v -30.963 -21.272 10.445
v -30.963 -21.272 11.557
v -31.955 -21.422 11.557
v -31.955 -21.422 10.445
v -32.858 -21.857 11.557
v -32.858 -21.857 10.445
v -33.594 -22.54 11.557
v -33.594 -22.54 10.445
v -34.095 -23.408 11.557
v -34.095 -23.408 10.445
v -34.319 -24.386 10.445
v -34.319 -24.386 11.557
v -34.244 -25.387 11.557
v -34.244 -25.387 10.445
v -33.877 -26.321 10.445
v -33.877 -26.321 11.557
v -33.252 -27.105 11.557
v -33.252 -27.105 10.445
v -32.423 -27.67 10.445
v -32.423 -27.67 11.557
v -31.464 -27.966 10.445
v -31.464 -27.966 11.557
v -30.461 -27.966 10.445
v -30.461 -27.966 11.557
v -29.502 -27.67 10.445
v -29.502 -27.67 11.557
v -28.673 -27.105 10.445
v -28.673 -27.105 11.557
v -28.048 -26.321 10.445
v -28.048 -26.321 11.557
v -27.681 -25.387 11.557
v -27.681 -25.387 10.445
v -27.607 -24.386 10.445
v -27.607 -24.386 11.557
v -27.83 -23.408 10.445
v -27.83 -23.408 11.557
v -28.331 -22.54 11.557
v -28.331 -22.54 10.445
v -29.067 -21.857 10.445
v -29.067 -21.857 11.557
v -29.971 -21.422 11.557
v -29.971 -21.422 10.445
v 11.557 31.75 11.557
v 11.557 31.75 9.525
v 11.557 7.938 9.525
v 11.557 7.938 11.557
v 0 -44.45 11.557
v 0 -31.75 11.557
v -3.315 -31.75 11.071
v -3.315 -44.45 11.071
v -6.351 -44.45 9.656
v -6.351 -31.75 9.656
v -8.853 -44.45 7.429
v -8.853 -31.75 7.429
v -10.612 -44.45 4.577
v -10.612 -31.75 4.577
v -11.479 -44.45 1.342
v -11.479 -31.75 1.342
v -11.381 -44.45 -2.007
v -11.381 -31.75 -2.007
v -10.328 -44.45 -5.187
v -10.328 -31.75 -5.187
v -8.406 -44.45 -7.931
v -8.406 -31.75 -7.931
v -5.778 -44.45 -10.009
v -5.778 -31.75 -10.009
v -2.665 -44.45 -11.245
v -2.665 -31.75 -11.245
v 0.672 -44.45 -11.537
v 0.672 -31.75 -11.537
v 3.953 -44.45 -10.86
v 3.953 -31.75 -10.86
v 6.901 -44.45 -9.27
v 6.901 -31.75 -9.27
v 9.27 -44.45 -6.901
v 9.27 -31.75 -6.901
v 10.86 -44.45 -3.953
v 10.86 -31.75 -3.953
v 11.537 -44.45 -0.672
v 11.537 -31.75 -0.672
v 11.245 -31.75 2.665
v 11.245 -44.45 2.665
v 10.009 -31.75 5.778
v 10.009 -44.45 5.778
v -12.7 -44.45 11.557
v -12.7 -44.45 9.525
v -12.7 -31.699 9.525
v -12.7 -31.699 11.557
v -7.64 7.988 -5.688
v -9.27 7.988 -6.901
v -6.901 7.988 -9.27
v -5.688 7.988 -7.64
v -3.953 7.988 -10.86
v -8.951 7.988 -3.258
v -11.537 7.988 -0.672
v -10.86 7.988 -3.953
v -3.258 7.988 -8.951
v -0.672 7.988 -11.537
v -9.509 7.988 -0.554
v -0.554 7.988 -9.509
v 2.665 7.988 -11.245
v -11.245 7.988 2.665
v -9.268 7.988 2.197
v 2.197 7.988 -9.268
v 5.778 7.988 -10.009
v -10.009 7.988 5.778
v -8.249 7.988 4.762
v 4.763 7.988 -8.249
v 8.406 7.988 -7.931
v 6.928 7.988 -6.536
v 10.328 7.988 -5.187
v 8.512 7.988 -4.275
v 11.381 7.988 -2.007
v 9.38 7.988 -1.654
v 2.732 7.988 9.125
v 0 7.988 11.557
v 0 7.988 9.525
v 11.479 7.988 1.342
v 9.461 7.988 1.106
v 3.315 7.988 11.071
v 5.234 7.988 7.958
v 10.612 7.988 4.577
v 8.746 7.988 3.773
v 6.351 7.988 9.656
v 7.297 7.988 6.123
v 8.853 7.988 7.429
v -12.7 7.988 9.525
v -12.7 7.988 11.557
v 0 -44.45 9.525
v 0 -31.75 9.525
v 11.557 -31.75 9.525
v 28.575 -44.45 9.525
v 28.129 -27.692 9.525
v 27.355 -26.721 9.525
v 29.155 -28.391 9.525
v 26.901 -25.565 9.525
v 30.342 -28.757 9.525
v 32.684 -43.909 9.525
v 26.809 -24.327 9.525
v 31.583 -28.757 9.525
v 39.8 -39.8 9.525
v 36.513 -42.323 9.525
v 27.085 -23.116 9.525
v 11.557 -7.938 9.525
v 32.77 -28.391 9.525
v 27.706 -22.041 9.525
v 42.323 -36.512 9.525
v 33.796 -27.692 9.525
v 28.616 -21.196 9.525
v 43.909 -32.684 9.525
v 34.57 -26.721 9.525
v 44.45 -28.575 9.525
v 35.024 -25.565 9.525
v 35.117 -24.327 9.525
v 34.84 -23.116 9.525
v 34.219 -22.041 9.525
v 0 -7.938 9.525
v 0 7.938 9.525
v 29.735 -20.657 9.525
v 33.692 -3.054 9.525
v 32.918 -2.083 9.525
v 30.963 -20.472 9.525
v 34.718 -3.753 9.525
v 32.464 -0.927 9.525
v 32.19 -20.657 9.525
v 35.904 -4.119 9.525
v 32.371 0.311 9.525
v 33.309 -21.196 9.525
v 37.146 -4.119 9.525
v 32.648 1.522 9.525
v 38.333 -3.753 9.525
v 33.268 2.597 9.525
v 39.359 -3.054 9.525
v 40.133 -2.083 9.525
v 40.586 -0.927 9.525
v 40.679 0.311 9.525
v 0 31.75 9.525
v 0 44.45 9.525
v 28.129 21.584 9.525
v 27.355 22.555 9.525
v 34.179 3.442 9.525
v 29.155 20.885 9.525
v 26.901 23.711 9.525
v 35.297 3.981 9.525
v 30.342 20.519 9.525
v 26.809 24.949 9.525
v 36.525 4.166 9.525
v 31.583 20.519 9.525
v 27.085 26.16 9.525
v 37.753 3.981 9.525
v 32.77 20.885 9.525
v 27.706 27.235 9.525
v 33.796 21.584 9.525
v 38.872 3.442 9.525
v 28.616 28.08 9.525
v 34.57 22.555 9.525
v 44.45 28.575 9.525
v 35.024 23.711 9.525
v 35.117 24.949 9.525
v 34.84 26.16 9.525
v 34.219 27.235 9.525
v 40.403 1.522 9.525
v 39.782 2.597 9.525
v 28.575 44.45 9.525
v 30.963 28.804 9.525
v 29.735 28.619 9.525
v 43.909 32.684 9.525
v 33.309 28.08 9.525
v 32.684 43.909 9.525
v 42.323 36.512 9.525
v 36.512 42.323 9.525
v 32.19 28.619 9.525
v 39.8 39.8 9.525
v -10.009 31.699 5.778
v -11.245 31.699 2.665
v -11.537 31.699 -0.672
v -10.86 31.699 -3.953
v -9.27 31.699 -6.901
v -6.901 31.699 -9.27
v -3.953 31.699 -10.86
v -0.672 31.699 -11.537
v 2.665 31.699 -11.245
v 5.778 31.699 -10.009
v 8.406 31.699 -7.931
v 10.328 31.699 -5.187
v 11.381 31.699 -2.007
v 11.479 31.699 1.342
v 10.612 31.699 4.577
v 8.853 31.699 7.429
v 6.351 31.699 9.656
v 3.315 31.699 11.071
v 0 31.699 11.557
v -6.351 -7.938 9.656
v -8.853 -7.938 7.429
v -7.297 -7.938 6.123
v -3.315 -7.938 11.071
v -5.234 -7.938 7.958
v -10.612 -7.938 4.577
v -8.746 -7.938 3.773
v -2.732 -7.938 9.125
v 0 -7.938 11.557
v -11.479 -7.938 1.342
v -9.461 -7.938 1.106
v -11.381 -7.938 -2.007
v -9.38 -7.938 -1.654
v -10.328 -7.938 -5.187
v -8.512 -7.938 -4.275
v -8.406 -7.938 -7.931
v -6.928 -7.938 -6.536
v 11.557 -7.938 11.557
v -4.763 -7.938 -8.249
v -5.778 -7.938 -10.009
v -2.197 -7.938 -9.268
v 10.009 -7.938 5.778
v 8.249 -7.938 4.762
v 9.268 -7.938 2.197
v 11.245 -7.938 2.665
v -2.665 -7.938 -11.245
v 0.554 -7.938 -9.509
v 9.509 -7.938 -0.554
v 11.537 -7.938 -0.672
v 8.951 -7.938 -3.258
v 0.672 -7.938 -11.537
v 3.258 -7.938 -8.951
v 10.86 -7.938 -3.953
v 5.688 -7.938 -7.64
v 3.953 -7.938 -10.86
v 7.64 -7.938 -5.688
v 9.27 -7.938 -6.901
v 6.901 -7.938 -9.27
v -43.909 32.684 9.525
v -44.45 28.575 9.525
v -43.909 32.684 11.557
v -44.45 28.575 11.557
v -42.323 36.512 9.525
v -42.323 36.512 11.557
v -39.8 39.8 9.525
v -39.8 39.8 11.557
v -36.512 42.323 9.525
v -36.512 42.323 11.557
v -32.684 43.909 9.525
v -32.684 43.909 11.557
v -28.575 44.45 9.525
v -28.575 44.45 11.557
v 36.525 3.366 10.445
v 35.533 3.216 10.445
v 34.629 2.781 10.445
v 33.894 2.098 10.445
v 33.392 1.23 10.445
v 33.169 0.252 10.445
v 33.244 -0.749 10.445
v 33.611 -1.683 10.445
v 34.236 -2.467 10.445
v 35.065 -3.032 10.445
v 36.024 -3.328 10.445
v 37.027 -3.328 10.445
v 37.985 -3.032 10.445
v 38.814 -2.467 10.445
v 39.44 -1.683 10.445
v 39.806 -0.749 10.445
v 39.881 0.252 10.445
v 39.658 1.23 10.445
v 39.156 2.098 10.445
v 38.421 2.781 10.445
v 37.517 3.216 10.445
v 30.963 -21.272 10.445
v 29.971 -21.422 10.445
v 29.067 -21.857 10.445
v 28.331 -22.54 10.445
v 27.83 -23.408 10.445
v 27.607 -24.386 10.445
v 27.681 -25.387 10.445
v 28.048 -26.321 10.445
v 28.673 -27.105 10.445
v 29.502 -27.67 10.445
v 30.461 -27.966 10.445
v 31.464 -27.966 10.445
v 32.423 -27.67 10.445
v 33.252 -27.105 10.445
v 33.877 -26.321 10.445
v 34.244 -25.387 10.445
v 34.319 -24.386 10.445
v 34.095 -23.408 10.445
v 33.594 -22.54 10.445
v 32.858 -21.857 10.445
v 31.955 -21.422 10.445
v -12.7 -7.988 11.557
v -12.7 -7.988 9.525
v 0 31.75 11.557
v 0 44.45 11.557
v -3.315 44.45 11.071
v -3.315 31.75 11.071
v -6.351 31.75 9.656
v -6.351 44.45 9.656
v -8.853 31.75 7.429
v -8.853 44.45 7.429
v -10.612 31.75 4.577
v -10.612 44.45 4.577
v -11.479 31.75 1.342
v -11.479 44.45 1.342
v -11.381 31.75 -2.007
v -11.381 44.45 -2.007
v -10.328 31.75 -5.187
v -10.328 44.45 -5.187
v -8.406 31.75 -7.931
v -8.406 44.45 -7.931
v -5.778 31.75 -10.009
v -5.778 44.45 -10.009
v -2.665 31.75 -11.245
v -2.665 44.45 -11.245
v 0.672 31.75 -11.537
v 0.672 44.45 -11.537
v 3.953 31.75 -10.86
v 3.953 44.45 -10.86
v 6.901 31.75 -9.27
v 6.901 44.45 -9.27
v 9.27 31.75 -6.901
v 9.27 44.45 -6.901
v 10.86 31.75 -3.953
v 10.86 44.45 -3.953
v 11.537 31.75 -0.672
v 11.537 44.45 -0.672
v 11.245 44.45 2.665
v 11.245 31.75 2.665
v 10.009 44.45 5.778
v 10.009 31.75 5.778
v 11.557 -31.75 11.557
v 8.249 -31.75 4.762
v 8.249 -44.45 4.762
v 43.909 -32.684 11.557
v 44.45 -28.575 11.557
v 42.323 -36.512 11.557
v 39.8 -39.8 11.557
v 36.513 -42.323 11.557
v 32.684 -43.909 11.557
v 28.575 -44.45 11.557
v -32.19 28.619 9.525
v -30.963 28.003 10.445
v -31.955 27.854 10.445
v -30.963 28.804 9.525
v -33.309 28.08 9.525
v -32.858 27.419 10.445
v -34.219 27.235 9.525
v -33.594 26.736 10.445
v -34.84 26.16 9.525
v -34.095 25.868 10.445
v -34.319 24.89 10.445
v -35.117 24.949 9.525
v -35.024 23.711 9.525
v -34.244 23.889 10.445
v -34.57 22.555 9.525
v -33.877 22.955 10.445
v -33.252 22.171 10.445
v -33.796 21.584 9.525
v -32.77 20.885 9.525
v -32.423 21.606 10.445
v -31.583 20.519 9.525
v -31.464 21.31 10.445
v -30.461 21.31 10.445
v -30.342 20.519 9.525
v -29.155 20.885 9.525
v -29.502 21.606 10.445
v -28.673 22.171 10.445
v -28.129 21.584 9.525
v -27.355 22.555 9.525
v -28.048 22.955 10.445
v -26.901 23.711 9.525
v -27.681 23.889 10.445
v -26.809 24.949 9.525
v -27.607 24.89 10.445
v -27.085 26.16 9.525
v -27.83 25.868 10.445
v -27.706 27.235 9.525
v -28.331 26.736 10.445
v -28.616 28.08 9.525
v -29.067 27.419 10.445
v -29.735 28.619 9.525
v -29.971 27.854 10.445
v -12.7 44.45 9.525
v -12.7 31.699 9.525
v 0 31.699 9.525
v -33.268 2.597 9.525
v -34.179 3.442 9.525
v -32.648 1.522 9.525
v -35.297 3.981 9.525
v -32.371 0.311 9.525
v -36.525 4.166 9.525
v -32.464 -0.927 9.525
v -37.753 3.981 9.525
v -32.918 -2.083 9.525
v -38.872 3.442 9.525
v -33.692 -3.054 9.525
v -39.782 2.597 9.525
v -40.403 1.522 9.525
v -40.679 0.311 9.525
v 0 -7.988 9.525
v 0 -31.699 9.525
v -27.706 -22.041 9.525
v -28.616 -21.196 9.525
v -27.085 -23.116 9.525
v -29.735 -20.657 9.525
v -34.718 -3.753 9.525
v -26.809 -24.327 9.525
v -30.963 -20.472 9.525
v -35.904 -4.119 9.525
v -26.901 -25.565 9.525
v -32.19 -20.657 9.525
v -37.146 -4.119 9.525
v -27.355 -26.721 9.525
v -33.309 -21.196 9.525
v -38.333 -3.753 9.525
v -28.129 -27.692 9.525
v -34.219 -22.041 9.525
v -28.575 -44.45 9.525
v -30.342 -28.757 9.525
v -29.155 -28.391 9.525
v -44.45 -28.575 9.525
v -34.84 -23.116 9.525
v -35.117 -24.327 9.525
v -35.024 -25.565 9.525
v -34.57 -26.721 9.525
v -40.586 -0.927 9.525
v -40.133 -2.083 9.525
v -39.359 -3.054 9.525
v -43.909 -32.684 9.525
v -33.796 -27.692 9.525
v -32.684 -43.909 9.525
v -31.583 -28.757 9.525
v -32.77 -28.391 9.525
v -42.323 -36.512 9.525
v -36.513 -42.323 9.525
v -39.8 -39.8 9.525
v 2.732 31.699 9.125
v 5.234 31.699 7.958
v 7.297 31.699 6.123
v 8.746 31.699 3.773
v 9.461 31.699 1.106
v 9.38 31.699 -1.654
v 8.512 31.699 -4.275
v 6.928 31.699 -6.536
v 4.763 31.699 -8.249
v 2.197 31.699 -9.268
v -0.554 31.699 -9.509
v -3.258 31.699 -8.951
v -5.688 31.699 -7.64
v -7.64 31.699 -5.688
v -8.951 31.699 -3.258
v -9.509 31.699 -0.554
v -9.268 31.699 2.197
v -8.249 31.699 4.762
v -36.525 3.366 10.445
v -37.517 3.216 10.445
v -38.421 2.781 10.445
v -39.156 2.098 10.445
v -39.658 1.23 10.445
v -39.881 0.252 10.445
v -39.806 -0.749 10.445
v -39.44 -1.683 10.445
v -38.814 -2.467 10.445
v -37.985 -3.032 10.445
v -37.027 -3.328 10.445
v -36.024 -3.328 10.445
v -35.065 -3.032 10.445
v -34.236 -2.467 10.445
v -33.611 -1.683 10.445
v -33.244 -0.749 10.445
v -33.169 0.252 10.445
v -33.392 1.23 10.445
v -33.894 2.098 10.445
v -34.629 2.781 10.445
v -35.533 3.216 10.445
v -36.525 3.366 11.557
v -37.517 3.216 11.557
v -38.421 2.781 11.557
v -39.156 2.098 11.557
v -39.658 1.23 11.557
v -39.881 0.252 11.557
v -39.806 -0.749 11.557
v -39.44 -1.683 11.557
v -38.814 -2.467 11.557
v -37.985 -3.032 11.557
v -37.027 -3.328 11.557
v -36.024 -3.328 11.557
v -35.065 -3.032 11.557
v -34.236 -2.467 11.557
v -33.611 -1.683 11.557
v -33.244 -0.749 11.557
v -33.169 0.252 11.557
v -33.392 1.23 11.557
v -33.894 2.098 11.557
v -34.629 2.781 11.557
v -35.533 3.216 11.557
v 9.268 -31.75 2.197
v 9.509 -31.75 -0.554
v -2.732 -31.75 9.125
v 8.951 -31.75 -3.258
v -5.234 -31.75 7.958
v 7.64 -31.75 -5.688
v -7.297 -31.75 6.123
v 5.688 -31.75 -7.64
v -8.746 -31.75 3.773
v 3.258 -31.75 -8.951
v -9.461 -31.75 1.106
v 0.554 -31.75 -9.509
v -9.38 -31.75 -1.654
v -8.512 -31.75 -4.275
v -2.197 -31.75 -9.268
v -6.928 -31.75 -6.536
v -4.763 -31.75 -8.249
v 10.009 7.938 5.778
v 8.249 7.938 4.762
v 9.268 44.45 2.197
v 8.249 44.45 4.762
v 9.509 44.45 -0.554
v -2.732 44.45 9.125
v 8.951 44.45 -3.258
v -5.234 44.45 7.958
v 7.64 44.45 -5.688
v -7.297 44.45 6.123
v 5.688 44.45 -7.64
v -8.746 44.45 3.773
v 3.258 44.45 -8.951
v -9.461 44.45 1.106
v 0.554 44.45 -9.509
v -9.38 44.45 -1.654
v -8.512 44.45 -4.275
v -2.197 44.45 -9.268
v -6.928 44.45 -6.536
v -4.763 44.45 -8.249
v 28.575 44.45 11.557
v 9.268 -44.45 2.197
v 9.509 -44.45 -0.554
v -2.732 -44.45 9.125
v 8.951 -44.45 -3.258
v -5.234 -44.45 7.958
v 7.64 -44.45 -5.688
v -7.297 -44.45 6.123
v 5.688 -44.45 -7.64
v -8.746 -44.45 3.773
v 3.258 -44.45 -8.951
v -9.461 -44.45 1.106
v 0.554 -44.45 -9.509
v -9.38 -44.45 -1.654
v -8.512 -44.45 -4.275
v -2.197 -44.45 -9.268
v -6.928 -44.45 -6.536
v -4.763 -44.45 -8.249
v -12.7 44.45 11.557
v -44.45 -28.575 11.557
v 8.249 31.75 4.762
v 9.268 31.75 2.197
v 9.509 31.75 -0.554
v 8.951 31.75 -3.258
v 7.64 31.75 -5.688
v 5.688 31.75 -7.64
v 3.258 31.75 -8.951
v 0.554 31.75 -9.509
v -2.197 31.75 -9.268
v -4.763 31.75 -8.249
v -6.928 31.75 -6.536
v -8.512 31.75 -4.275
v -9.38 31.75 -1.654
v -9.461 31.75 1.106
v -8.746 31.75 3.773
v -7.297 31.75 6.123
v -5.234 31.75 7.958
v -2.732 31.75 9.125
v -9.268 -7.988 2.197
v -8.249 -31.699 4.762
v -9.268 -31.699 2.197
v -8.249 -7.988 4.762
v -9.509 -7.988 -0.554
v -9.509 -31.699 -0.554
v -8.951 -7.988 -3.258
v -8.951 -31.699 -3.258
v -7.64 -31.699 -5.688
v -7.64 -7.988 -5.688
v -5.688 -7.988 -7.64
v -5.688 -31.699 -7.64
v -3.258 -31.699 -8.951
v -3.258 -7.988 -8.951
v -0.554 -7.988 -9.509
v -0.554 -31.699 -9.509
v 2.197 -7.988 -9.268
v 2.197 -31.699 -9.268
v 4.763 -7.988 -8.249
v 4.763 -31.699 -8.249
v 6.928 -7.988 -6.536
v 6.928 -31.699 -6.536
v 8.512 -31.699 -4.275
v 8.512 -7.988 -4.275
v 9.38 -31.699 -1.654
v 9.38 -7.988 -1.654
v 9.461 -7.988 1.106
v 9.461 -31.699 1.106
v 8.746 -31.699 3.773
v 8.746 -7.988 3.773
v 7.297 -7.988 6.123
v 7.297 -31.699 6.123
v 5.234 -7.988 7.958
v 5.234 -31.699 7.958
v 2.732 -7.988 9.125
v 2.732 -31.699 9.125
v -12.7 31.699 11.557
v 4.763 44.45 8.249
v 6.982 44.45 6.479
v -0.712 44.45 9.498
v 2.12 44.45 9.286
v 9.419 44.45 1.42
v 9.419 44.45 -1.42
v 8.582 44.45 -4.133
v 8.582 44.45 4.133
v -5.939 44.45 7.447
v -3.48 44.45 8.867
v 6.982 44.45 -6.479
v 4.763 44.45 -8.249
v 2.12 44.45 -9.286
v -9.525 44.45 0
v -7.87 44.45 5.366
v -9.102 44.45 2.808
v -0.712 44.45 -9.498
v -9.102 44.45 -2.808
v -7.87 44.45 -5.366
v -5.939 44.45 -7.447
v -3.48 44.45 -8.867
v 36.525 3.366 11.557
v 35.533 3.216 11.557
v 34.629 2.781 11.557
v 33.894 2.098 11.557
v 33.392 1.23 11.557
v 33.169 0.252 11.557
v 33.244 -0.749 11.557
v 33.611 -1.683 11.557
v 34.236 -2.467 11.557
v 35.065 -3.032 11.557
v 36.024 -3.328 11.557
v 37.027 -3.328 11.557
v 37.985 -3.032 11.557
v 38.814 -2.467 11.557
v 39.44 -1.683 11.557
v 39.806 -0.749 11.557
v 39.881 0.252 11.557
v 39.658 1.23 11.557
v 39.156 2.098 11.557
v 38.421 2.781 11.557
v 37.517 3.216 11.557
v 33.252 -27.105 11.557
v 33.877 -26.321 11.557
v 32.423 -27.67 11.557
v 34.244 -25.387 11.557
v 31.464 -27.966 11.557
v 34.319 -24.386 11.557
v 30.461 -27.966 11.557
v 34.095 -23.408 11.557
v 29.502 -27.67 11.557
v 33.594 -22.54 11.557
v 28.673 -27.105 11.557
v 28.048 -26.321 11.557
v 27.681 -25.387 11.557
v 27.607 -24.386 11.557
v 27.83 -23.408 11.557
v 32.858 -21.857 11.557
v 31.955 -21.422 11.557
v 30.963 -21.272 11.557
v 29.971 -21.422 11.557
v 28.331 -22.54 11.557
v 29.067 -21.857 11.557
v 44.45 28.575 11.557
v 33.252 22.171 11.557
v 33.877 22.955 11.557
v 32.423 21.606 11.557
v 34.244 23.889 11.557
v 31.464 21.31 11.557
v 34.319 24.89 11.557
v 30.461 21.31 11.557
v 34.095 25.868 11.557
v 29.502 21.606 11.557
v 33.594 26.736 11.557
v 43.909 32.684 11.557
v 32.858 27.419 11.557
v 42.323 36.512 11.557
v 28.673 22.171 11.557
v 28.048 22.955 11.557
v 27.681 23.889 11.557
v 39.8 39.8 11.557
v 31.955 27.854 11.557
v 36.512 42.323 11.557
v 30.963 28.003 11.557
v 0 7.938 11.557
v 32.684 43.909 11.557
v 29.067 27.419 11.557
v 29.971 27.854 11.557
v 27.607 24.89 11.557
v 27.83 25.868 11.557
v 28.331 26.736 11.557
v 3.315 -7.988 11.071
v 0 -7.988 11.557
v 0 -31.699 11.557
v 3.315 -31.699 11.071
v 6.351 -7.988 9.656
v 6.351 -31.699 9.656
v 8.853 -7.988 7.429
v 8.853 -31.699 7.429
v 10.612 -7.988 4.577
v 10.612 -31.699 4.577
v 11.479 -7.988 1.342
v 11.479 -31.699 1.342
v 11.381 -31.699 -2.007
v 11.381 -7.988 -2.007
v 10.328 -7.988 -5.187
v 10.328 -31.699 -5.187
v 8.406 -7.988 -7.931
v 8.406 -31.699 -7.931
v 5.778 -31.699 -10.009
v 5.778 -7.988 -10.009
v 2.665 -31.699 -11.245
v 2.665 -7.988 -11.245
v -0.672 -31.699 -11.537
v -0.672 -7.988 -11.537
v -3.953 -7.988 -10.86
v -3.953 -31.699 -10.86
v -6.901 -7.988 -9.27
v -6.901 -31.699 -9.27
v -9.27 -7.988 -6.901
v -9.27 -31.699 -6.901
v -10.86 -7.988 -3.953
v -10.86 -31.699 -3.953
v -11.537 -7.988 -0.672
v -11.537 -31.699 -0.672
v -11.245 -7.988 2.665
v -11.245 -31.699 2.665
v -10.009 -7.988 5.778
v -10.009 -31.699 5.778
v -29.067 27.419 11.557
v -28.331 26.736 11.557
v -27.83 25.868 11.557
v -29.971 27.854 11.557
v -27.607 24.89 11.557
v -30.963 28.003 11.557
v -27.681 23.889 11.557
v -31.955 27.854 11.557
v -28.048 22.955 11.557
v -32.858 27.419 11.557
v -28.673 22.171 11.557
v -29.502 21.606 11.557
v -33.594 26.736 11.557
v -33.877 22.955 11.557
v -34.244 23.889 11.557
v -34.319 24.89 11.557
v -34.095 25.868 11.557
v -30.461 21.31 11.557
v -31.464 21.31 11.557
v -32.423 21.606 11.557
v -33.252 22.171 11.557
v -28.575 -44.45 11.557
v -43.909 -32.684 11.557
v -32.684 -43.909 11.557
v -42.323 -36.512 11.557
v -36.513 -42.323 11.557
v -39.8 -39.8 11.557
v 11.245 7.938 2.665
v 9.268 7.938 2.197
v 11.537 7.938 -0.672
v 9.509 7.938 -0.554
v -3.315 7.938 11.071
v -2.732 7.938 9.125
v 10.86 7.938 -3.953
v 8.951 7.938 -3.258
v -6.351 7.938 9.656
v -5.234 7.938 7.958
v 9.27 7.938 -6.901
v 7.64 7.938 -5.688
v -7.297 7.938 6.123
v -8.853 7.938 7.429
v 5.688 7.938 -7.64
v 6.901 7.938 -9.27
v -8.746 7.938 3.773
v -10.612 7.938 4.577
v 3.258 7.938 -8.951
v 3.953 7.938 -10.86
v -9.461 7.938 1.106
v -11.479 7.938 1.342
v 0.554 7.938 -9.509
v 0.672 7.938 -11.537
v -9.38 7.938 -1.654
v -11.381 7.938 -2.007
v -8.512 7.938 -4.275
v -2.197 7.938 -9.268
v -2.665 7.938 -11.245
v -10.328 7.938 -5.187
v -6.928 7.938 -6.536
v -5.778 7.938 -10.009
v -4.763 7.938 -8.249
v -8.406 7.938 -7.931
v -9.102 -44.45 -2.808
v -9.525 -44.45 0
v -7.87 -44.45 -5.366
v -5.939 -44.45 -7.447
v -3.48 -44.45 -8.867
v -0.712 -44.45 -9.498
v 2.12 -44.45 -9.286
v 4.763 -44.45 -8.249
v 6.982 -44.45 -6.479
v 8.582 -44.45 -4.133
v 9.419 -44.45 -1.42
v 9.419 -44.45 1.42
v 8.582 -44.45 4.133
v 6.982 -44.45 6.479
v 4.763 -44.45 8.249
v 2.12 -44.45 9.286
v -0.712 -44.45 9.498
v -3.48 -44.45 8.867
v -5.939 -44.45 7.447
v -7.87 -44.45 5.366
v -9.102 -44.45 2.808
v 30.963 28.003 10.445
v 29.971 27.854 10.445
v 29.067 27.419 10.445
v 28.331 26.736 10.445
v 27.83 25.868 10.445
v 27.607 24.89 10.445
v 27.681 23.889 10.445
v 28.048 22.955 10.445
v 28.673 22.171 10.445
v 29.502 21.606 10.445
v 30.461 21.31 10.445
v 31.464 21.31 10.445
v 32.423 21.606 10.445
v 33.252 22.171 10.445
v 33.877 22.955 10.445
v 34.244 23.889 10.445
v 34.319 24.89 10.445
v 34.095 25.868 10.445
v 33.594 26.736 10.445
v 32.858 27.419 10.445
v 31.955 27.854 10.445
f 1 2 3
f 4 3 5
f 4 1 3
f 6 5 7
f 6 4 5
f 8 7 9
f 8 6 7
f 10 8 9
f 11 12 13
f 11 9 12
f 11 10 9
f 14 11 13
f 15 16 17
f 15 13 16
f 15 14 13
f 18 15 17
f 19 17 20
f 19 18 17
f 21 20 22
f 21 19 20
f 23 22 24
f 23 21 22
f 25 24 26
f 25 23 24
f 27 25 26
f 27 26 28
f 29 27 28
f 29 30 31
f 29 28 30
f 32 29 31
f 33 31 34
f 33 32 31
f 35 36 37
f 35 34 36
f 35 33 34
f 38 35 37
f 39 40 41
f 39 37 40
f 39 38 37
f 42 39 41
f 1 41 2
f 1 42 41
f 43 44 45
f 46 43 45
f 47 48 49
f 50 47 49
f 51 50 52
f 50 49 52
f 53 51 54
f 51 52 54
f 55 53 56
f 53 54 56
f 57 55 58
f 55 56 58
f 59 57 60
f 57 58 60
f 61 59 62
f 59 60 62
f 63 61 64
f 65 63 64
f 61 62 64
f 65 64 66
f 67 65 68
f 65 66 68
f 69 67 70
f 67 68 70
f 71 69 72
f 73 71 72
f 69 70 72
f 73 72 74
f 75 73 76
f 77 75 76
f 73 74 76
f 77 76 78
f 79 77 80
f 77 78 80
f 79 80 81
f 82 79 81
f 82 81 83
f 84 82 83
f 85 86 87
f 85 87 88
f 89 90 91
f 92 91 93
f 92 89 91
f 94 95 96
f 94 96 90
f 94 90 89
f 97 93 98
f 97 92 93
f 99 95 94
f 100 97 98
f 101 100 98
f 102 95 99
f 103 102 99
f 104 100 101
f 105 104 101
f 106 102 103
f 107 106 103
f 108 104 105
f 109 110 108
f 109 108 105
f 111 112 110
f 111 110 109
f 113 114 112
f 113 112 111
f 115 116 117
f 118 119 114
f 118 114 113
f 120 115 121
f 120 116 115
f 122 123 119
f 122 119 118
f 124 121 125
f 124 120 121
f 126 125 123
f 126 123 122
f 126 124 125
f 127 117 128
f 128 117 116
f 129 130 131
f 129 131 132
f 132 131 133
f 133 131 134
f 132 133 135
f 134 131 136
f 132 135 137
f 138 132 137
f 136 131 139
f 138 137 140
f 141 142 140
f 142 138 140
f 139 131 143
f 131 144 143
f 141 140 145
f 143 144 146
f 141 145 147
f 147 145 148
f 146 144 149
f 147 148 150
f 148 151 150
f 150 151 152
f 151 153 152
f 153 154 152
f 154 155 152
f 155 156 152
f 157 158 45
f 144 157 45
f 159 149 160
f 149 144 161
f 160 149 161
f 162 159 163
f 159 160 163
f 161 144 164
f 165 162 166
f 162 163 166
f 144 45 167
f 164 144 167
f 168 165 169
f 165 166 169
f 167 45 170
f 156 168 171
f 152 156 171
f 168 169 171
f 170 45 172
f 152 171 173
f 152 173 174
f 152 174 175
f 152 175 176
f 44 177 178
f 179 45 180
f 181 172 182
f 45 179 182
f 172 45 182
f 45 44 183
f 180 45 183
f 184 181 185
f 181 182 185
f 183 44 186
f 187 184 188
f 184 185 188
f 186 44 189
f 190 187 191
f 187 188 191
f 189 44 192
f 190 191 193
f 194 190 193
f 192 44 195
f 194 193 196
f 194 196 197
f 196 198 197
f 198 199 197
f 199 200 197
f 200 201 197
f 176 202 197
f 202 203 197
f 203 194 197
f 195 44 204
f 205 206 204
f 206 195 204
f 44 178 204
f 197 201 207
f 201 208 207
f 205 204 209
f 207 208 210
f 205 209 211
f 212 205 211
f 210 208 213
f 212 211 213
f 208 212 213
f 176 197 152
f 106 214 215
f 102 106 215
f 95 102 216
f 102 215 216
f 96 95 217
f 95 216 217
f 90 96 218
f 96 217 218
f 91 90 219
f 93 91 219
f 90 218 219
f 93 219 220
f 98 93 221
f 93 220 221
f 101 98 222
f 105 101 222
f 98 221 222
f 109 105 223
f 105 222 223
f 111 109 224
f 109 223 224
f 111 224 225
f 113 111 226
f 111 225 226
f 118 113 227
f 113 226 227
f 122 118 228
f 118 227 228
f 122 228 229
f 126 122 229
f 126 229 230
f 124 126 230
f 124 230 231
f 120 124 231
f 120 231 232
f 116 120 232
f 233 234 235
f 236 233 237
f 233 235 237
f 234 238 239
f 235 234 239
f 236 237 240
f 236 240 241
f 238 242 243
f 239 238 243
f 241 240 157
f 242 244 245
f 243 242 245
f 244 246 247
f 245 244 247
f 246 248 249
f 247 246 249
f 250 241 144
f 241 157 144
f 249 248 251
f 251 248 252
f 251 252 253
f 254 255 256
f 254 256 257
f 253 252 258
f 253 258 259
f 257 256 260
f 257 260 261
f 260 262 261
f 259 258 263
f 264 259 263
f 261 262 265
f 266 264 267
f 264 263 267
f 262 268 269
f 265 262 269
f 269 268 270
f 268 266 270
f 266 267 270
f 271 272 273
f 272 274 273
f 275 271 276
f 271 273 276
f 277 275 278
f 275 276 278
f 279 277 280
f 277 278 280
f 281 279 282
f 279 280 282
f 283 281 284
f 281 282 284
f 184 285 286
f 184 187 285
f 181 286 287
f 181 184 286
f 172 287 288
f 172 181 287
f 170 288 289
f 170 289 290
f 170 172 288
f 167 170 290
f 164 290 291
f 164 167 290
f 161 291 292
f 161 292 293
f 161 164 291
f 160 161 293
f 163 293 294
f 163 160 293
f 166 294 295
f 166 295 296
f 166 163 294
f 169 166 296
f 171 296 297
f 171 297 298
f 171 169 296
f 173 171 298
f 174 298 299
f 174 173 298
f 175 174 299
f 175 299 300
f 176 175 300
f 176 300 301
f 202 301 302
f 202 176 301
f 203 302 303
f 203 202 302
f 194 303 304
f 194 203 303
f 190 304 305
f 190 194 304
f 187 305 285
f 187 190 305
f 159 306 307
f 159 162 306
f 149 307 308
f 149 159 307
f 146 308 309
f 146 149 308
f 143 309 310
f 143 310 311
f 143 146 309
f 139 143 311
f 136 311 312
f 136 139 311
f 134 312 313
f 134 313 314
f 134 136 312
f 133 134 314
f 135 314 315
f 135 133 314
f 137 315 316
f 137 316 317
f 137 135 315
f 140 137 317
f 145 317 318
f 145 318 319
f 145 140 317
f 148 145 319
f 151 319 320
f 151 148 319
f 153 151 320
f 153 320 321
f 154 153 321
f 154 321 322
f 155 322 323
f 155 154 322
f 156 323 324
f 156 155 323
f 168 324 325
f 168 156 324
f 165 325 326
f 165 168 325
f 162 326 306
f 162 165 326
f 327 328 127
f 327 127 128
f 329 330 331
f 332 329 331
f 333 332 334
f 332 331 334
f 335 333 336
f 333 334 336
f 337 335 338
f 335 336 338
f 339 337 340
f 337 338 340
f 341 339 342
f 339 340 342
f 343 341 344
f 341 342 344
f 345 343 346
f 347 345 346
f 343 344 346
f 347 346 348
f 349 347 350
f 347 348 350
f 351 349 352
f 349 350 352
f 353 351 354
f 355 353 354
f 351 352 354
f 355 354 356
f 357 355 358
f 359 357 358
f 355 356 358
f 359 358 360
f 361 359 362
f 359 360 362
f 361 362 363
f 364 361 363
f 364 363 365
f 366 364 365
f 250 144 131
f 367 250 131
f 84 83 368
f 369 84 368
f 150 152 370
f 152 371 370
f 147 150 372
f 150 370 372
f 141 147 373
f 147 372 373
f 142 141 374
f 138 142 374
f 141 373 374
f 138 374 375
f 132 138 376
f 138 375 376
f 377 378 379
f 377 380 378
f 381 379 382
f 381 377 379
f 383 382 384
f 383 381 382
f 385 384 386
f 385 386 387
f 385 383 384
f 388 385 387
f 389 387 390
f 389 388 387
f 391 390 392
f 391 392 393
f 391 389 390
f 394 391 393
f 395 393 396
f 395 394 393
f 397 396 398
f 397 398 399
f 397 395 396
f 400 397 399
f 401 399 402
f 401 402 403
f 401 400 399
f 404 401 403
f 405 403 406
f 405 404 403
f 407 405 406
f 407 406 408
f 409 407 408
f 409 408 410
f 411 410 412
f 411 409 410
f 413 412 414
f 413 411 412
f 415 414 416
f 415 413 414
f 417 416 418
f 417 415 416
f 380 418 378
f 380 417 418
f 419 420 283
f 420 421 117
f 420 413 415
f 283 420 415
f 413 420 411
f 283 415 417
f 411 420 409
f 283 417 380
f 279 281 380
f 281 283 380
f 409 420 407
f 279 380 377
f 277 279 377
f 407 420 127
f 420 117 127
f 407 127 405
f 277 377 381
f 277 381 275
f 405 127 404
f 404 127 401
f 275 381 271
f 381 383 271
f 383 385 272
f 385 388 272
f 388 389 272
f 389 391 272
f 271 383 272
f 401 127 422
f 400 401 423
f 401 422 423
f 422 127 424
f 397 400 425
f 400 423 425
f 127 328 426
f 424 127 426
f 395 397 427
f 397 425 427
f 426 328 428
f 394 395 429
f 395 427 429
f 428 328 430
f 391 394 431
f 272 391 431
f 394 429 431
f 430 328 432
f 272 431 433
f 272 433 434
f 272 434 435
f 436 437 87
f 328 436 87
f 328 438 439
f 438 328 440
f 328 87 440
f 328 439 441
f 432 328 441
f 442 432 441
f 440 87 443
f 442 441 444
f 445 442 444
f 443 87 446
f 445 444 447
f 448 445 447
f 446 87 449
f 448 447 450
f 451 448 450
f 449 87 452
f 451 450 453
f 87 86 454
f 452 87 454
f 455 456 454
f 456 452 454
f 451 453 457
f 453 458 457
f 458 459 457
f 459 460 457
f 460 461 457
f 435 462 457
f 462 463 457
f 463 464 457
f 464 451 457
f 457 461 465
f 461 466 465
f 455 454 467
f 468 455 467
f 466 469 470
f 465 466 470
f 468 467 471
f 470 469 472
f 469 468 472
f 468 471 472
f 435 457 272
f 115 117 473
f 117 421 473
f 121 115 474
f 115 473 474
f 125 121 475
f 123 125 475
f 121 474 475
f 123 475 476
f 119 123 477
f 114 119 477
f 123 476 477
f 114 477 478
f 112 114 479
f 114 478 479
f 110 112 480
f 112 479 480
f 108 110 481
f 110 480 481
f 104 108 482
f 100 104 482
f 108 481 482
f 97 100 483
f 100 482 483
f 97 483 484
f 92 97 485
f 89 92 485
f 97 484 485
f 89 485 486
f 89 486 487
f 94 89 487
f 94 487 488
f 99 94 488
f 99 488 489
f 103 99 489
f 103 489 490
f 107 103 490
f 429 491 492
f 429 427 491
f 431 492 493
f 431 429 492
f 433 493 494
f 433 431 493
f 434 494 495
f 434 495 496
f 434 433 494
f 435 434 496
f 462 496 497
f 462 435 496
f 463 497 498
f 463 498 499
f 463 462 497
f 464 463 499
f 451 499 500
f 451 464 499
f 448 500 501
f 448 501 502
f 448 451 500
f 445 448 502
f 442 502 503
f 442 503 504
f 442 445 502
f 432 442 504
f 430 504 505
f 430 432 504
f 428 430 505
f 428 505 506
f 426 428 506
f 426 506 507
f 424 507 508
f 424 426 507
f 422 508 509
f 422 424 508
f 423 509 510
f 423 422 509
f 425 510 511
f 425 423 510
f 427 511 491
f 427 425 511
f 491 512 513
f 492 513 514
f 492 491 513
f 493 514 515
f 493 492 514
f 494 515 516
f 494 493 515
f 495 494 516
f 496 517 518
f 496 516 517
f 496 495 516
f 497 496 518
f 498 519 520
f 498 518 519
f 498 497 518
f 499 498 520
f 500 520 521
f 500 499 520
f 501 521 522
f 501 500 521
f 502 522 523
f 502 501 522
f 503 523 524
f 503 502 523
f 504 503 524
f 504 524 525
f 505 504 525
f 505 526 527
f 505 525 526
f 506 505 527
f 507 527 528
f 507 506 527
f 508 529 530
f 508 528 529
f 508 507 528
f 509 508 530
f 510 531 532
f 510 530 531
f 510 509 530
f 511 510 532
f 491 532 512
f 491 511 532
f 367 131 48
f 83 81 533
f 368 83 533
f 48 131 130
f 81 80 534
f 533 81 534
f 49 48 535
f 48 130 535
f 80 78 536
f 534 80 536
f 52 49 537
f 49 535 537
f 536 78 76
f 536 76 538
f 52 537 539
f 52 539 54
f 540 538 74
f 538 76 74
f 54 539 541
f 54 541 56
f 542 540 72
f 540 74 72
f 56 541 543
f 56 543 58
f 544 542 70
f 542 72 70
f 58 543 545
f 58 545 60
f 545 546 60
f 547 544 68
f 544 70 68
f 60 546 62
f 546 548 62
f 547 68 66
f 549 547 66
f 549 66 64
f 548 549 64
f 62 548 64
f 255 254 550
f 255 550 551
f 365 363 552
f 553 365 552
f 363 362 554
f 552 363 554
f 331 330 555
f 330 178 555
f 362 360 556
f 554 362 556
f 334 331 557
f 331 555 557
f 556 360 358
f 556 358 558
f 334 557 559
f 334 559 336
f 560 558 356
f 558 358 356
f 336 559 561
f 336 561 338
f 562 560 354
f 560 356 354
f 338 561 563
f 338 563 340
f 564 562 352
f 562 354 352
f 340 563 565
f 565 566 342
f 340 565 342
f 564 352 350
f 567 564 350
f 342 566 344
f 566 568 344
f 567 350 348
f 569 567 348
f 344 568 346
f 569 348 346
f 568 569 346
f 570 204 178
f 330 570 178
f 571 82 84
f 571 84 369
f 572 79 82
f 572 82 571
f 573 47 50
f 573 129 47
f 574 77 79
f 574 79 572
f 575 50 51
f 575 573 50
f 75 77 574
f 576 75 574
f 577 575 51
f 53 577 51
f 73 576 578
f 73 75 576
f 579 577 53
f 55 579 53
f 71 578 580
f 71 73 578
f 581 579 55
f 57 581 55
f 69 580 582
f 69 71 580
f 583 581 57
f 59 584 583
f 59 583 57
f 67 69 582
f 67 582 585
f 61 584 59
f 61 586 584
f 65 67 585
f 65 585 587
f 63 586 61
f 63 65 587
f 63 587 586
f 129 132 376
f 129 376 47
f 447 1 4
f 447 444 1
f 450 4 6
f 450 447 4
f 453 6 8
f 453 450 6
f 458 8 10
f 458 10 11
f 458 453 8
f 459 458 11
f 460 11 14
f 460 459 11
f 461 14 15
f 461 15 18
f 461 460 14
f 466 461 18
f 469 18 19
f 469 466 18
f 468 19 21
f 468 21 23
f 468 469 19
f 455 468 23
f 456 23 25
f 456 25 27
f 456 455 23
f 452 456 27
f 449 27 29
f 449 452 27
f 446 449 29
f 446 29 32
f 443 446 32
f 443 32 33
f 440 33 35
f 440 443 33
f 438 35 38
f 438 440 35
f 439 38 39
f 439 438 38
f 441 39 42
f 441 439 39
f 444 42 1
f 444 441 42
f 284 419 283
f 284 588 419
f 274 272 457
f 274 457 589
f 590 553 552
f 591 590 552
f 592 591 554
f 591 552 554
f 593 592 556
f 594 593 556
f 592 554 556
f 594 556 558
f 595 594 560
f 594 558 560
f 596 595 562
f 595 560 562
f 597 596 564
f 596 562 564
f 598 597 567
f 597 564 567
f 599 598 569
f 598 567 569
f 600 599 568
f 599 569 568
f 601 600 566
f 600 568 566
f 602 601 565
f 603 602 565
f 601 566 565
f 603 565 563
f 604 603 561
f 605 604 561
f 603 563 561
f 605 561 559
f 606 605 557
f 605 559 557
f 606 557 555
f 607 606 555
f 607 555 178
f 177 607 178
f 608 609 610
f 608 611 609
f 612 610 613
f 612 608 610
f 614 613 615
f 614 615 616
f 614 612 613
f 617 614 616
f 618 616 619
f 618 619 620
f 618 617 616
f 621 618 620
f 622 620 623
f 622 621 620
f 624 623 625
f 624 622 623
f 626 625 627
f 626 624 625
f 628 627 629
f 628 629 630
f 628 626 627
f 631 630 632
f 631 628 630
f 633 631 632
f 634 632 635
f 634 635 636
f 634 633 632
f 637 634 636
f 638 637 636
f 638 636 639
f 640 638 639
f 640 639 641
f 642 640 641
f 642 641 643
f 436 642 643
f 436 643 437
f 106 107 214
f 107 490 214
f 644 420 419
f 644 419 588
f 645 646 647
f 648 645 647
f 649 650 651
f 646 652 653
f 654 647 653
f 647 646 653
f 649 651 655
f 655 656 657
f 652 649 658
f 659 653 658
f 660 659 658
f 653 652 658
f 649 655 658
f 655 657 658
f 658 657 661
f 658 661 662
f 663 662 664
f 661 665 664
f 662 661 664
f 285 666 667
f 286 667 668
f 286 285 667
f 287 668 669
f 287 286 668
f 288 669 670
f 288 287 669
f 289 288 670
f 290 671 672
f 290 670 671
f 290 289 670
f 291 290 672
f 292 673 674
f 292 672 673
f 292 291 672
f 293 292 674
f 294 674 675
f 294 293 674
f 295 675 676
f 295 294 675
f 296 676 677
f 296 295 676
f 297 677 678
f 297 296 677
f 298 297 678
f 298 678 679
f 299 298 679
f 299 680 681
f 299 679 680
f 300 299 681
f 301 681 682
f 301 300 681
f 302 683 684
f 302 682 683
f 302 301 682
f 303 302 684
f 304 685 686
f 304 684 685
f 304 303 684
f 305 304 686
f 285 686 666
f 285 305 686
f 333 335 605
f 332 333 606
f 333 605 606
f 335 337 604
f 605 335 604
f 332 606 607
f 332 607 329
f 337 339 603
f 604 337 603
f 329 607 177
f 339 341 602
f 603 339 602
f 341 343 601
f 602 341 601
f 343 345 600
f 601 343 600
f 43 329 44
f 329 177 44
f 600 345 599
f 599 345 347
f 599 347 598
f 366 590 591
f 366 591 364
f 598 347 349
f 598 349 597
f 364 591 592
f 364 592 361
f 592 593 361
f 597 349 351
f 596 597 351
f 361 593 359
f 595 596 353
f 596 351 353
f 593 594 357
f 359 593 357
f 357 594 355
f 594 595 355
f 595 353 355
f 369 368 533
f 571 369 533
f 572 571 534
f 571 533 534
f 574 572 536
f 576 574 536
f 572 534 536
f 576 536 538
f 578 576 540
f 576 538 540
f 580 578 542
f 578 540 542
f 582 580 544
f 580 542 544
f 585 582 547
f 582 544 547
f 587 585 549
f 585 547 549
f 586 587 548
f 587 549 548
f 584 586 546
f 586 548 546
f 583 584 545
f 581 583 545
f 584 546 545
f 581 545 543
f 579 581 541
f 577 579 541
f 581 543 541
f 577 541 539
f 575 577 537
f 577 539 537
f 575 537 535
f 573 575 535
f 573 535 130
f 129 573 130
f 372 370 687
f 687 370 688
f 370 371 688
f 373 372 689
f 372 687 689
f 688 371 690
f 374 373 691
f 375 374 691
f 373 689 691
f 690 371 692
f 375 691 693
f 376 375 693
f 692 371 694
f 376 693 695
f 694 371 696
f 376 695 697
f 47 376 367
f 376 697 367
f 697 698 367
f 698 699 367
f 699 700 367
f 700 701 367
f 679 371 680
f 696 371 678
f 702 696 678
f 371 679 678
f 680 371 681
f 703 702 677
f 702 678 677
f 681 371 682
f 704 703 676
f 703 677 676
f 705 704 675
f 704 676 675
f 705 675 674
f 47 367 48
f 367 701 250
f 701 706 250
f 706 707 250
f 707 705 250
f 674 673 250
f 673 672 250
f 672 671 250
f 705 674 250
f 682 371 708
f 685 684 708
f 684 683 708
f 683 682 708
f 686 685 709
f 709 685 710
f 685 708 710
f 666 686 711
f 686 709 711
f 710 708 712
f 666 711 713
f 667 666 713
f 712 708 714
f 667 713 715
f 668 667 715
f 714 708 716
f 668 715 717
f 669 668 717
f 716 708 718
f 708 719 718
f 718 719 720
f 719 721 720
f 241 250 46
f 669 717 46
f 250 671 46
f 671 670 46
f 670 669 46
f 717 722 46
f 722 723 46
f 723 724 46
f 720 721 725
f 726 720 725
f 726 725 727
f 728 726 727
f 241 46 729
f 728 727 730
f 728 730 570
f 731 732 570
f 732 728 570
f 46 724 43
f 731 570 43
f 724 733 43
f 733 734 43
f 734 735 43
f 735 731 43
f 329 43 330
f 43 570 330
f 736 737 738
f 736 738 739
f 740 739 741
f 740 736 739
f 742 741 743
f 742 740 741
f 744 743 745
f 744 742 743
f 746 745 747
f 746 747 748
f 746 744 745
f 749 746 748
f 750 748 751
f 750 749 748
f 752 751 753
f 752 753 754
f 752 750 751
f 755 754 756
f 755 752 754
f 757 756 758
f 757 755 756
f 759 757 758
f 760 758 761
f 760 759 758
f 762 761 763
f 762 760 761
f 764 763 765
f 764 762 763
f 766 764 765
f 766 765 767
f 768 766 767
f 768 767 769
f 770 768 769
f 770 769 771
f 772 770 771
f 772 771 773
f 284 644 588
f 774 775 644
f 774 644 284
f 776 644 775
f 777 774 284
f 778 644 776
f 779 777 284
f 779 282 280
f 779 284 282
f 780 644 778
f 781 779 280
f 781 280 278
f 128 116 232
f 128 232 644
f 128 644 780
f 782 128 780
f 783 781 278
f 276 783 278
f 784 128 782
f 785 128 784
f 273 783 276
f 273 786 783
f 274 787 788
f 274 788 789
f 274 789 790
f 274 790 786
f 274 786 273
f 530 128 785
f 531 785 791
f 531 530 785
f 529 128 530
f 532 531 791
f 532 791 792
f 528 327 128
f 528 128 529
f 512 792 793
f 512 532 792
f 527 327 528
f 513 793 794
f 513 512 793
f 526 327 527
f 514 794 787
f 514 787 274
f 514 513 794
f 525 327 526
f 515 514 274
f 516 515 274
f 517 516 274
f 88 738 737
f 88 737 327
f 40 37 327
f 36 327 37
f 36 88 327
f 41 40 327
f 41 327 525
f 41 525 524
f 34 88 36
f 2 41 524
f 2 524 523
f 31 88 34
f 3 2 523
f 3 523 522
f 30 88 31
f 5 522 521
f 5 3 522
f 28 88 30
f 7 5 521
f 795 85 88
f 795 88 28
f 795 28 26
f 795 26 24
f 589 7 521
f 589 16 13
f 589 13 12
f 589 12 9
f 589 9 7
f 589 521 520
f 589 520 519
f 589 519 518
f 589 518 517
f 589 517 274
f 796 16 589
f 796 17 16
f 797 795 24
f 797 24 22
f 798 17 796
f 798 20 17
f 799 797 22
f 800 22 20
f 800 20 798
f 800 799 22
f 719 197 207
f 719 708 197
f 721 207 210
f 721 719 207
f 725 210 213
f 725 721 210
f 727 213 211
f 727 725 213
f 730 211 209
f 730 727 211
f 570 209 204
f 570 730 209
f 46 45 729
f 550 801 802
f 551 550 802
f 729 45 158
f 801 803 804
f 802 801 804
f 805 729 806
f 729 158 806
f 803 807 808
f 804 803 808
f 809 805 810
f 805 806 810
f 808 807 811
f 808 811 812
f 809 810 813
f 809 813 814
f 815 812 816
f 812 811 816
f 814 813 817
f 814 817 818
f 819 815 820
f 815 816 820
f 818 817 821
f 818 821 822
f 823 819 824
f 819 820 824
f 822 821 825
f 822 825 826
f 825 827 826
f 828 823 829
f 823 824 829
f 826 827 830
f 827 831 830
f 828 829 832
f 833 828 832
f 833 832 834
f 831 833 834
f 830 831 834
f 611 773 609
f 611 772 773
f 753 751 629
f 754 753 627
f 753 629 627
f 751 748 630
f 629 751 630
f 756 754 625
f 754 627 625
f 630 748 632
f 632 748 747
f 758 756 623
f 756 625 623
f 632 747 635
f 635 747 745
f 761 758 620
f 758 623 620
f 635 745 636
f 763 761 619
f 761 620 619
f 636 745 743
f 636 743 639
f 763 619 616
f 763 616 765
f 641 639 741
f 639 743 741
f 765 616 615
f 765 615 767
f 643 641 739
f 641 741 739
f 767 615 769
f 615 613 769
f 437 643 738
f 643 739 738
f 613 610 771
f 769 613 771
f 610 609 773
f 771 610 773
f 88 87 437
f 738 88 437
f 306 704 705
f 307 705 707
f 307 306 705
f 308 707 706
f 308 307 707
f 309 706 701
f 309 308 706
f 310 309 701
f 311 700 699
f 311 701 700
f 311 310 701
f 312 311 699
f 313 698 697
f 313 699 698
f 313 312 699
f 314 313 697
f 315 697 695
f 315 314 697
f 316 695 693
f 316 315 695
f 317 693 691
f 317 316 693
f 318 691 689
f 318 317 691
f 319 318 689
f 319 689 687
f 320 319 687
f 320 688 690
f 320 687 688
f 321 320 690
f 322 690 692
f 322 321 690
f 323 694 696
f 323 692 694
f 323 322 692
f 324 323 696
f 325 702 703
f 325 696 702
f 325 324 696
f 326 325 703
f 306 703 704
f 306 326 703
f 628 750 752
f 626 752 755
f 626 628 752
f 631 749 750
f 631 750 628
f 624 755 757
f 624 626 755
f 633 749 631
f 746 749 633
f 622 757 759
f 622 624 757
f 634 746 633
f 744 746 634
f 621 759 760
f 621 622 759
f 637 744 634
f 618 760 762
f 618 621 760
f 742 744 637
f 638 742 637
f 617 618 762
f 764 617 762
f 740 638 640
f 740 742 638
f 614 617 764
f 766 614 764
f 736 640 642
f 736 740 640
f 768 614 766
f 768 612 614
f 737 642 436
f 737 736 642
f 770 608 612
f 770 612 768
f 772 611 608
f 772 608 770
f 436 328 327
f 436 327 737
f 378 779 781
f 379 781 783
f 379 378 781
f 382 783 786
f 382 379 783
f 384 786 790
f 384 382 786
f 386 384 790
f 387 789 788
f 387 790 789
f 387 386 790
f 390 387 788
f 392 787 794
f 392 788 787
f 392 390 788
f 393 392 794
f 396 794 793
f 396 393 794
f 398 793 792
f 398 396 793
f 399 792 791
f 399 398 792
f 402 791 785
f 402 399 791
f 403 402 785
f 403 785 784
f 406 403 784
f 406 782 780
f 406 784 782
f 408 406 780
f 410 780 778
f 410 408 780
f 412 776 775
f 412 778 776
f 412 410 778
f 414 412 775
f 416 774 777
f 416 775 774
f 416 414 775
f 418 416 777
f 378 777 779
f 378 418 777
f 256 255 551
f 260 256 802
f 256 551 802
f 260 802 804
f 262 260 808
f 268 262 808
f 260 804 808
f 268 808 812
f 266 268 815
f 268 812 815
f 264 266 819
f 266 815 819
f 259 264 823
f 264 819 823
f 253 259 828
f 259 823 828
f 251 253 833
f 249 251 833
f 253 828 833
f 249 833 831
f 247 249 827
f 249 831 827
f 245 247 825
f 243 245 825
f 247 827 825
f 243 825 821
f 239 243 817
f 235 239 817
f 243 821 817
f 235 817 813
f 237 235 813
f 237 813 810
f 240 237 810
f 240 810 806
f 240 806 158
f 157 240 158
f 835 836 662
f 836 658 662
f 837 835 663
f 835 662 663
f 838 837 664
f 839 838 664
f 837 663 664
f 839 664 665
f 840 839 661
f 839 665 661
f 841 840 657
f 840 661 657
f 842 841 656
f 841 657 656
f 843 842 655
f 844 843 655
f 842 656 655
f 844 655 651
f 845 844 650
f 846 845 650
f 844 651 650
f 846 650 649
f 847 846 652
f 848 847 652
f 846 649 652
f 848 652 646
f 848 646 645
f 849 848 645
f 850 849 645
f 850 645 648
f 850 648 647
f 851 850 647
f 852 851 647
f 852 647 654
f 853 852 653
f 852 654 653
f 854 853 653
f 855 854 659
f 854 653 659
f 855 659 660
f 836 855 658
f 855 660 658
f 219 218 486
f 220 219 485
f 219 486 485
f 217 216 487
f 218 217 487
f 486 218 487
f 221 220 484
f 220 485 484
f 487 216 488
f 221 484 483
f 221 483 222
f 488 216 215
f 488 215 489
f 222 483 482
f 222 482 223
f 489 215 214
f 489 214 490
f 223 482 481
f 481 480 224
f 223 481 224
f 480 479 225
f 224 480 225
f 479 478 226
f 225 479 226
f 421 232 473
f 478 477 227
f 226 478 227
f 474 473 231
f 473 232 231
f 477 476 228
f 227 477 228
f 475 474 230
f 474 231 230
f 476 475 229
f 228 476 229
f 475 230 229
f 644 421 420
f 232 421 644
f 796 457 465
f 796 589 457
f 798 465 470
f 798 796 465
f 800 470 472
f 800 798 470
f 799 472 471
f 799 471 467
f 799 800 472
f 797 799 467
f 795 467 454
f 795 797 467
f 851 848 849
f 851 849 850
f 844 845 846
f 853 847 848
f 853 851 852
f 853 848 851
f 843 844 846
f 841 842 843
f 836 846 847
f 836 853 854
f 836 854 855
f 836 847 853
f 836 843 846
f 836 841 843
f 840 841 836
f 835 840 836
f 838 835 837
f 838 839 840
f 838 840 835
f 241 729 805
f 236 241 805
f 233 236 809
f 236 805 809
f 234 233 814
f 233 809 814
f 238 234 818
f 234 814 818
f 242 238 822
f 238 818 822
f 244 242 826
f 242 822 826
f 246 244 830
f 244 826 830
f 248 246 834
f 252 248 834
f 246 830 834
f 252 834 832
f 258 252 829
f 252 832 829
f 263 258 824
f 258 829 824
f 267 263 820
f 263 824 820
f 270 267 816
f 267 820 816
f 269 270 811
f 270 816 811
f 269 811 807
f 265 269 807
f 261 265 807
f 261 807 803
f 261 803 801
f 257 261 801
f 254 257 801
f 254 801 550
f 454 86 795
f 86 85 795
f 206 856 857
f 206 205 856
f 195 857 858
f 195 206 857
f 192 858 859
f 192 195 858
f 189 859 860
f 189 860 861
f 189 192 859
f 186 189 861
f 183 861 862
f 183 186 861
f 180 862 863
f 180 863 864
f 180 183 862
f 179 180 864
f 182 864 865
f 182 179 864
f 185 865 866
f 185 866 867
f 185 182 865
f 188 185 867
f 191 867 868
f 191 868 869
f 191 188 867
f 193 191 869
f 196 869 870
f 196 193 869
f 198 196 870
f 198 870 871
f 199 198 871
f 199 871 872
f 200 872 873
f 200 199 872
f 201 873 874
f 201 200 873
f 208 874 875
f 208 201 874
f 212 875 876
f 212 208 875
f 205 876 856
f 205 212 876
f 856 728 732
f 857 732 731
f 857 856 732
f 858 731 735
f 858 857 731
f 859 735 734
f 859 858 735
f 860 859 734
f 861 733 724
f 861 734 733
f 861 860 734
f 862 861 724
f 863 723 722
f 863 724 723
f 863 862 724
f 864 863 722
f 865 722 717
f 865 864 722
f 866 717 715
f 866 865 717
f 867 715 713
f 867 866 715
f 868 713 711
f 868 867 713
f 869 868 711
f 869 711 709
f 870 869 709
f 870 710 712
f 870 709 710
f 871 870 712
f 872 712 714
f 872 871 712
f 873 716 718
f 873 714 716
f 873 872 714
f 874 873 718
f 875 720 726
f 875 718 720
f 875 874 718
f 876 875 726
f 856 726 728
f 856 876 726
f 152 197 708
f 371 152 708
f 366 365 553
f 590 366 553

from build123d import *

# Parameters (mm, degrees)
EXTRUDE1_DEPTH                                = 44.45
CUT_EXTRUDE1_DEPTH                            = 22.082
CUT_EXTRUDE1_DEPTH_BACK                       = 3.032
EXTRUDE2_DEPTH                                = 11.85545
EXTRUDE2_DEPTH_BACK                           = 11.85545
EXTRUDE3_DEPTH                                = 11.85545
EXTRUDE3_DEPTH_BACK                           = 11.85545
EXTRUDE4_START                                = -24.60625
SKETCH5_W                                     = 31.75
SKETCH5_H                                     = 2.032
EXTRUDE4_DEPTH                                = 88.9
SKETCH6_W                                     = 9.525
SKETCH6_H                                     = 88.9
CSK_FOR_8_FLAT_HEAD_MACHINE_SCREW2_AT_2_COUNT = 2
CSK_FOR_8_FLAT_HEAD_MACHINE_SCREW2_AT_2_PITCH = 25.258138545
CSK_FOR_8_FLAT_HEAD_MACHINE_SCREW2_AT_3_COUNT = 2
CSK_FOR_8_FLAT_HEAD_MACHINE_SCREW2_AT_3_PITCH = 25.258138545
CSK_FOR_8_FLAT_HEAD_MACHINE_SCREW2_AT_4_COUNT = 2
CSK_FOR_8_FLAT_HEAD_MACHINE_SCREW2_AT_4_PITCH = 71.844514007
CSK_FOR_8_FLAT_HEAD_MACHINE_SCREW2_AT_5_COUNT = 2
CSK_FOR_8_FLAT_HEAD_MACHINE_SCREW2_AT_5_PITCH = 73.0504
CSK_FOR_8_FLAT_HEAD_MACHINE_SCREW2_AT_6_COUNT = 2
CSK_FOR_8_FLAT_HEAD_MACHINE_SCREW2_AT_6_PITCH = 71.844514007
FILLET1_R                                     = 15.875
FILLET2_R                                     = 15.875
FILLET3_R                                     = 15.875
FILLET4_R                                     = 15.875


with BuildPart() as part:
    # Sketch1 → Extrude1 (new body, symmetric)
    with BuildSketch(Plane(origin=(0, 0, 0), x_dir=(1, 0, 0), z_dir=(0, 1, 0))):
        with BuildLine():
            Line((0, -9.525), (44.45, -9.525))
            Line((44.45, -9.525), (44.45, -11.557))
            Line((44.45, -11.557), (0, -11.557))
            ThreePointArc((0, -11.557), (-5.7785, 10.008655592), (10.008655592, -5.7785))
            Line((10.008655592, -5.7785), (8.248891971, -4.7625))
            ThreePointArc((8.248891971, -4.7625), (-4.7625, 8.248891971), (0, -9.525))
        make_face()
    extrude(amount=EXTRUDE1_DEPTH, both=True)

    # Sketch2 → Cut-Extrude1 (cut, two sides)
    with BuildSketch(Plane(origin=(0, 0, 9.525), x_dir=(-1, 0, 0), z_dir=(0, 0, -1))) as cut_extrude1_sk:
        Polygon((11.557, 264.592751947), (11.557, 44.45), (11.557, 31.75), (-11.557, 31.75), (-11.557, 7.9375), (11.557, 7.9375), (11.557, -7.9375), (-11.557, -7.9375), (-11.557, -31.75), (11.557, -31.75), (11.557, -44.45), (11.557, -264.592751947), (451.842503895, -264.592751947), (451.842503895, 264.592751947), align=None)
    extrude(amount=CUT_EXTRUDE1_DEPTH, mode=Mode.SUBTRACT)
    extrude(cut_extrude1_sk.sketch, amount=-CUT_EXTRUDE1_DEPTH_BACK, mode=Mode.SUBTRACT)


with BuildPart() as body_2:
    # Sketch3 → Extrude2 (new body, two sides)
    with BuildSketch(Plane(origin=(0, 19.84375, 0), x_dir=(-1, 0, 0), z_dir=(0, 1, 0))) as extrude2_sk:
        with BuildLine():
            Line((44.45, 11.557), (44.45, 9.525))
            Line((44.45, 9.525), (0, 9.525))
            ThreePointArc((0, 9.525), (-4.7625, -8.248891971), (8.248891971, 4.7625))
            Line((8.248891971, 4.7625), (10.008655592, 5.7785))
            ThreePointArc((10.008655592, 5.7785), (-5.7785, -10.008655592), (0, 11.557))
            Line((0, 11.557), (44.45, 11.557))
        make_face()
    extrude(amount=EXTRUDE2_DEPTH)
    extrude(extrude2_sk.sketch, amount=-EXTRUDE2_DEPTH_BACK)



with BuildPart() as body_3:
    # Sketch4 → Extrude3 (new body, two sides)
    with BuildSketch(Plane(origin=(0, -19.84375, 0), x_dir=(-1, 0, 0), z_dir=(0, 1, 0))) as extrude3_sk:
        with BuildLine():
            Line((0, 9.525), (44.45, 9.525))
            Line((44.45, 9.525), (44.45, 11.557))
            Line((44.45, 11.557), (0, 11.557))
            ThreePointArc((0, 11.557), (-5.7785, -10.008655592), (10.008655592, 5.7785))
            Line((10.008655592, 5.7785), (8.248891971, 4.7625))
            ThreePointArc((8.248891971, 4.7625), (-4.7625, -8.248891971), (0, 9.525))
        make_face()
    extrude(amount=EXTRUDE3_DEPTH)
    extrude(extrude3_sk.sketch, amount=-EXTRUDE3_DEPTH_BACK)


with BuildPart() as body_2_1:
    add(body_2.part)

    add(body_3.part)  # Extrude4 merges body 3
    # Sketch5 → Extrude4 (add)
    with BuildSketch(Plane(origin=(0, -19.84375, 0), x_dir=(-1, 0, 0), z_dir=(0, 1, 0)).offset(EXTRUDE4_START)):
        with Locations((28.575, 10.541)):
            Rectangle(SKETCH5_W, SKETCH5_H)
    extrude(amount=EXTRUDE4_DEPTH)

    # Sketch9 → CSK for #8 Flat Head Machine Screw2 (revolve, cut)
    with BuildSketch(Plane(origin=(-36.5252, 0, 9.525), x_dir=(0, 1, 0), z_dir=(1, 0, 0))):
        Polygon((0, 0), (0, 4.130193213), (3.3655, 2.1079968), (3.3655, 0.920409763), (4.1656, 0), align=None)
    csk_for_8_flat_head_machine_screw2 = revolve(axis=Axis((-36.5252, 0, 3.175), (0, 0, 1)), mode=Mode.SUBTRACT)

    # CSK for #8 Flat Head Machine Screw2 at 2: CSK for #8 Flat Head Machine Screw2 ×2
    with Locations(*[Vector(0.220230006, 0.975447971, 0) * (i * CSK_FOR_8_FLAT_HEAD_MACHINE_SCREW2_AT_2_PITCH) for i in range(1, CSK_FOR_8_FLAT_HEAD_MACHINE_SCREW2_AT_2_COUNT)]):
        add(csk_for_8_flat_head_machine_screw2, mode=Mode.SUBTRACT)

    # CSK for #8 Flat Head Machine Screw2 at 3: CSK for #8 Flat Head Machine Screw2 ×2
    with Locations(*[Vector(0.220230006, -0.975447971, 0) * (i * CSK_FOR_8_FLAT_HEAD_MACHINE_SCREW2_AT_3_PITCH) for i in range(1, CSK_FOR_8_FLAT_HEAD_MACHINE_SCREW2_AT_3_COUNT)]):
        add(csk_for_8_flat_head_machine_screw2, mode=Mode.SUBTRACT)

    # Fillet3
    fillet3_edges = [body_2_1.edges().sort_by_distance(p)[0] for p in [
        (-44.45, 44.45, 10.541),
    ]]
    fillet(fillet3_edges, radius=FILLET3_R)

    # Fillet4
    fillet4_edges = [body_2_1.edges().sort_by_distance(p)[0] for p in [
        (-44.45, -44.45, 10.541),
    ]]
    fillet(fillet4_edges, radius=FILLET4_R)


with BuildPart() as body_3_2:
    # Sketch6 → Revolve1 (revolve)
    with BuildSketch(Plane.XY):
        with Locations((-4.7625, 0)):
            Rectangle(SKETCH6_W, SKETCH6_H)
    revolve(axis=Axis((0, 42.361566849, 0), (0, -1, 0)))


with BuildPart() as part_1:
    add(part.part)

    # CSK for #8 Flat Head Machine Screw2 at 4: CSK for #8 Flat Head Machine Screw2 ×2
    with Locations(*[Vector(0.939359128, -0.342935022, 0) * (i * CSK_FOR_8_FLAT_HEAD_MACHINE_SCREW2_AT_4_PITCH) for i in range(1, CSK_FOR_8_FLAT_HEAD_MACHINE_SCREW2_AT_4_COUNT)]):
        add(csk_for_8_flat_head_machine_screw2, mode=Mode.SUBTRACT)

    # CSK for #8 Flat Head Machine Screw2 at 5: CSK for #8 Flat Head Machine Screw2 ×2
    with Locations(*[(i * CSK_FOR_8_FLAT_HEAD_MACHINE_SCREW2_AT_5_PITCH, 0, 0) for i in range(1, CSK_FOR_8_FLAT_HEAD_MACHINE_SCREW2_AT_5_COUNT)]):
        add(csk_for_8_flat_head_machine_screw2, mode=Mode.SUBTRACT)

    # CSK for #8 Flat Head Machine Screw2 at 6: CSK for #8 Flat Head Machine Screw2 ×2
    with Locations(*[Vector(0.939359128, 0.342935022, 0) * (i * CSK_FOR_8_FLAT_HEAD_MACHINE_SCREW2_AT_6_PITCH) for i in range(1, CSK_FOR_8_FLAT_HEAD_MACHINE_SCREW2_AT_6_COUNT)]):
        add(csk_for_8_flat_head_machine_screw2, mode=Mode.SUBTRACT)

    # Fillet1
    fillet1_edges = [part_1.edges().sort_by_distance(p)[0] for p in [
        (44.45, 44.45, 10.541),
    ]]
    fillet(fillet1_edges, radius=FILLET1_R)

    # Fillet2
    fillet2_edges = [part_1.edges().sort_by_distance(p)[0] for p in [
        (44.45, -44.45, 10.541),
    ]]
    fillet(fillet2_edges, radius=FILLET2_R)


solid = Compound([body_2_1.part, body_3_2.part, part_1.part])
